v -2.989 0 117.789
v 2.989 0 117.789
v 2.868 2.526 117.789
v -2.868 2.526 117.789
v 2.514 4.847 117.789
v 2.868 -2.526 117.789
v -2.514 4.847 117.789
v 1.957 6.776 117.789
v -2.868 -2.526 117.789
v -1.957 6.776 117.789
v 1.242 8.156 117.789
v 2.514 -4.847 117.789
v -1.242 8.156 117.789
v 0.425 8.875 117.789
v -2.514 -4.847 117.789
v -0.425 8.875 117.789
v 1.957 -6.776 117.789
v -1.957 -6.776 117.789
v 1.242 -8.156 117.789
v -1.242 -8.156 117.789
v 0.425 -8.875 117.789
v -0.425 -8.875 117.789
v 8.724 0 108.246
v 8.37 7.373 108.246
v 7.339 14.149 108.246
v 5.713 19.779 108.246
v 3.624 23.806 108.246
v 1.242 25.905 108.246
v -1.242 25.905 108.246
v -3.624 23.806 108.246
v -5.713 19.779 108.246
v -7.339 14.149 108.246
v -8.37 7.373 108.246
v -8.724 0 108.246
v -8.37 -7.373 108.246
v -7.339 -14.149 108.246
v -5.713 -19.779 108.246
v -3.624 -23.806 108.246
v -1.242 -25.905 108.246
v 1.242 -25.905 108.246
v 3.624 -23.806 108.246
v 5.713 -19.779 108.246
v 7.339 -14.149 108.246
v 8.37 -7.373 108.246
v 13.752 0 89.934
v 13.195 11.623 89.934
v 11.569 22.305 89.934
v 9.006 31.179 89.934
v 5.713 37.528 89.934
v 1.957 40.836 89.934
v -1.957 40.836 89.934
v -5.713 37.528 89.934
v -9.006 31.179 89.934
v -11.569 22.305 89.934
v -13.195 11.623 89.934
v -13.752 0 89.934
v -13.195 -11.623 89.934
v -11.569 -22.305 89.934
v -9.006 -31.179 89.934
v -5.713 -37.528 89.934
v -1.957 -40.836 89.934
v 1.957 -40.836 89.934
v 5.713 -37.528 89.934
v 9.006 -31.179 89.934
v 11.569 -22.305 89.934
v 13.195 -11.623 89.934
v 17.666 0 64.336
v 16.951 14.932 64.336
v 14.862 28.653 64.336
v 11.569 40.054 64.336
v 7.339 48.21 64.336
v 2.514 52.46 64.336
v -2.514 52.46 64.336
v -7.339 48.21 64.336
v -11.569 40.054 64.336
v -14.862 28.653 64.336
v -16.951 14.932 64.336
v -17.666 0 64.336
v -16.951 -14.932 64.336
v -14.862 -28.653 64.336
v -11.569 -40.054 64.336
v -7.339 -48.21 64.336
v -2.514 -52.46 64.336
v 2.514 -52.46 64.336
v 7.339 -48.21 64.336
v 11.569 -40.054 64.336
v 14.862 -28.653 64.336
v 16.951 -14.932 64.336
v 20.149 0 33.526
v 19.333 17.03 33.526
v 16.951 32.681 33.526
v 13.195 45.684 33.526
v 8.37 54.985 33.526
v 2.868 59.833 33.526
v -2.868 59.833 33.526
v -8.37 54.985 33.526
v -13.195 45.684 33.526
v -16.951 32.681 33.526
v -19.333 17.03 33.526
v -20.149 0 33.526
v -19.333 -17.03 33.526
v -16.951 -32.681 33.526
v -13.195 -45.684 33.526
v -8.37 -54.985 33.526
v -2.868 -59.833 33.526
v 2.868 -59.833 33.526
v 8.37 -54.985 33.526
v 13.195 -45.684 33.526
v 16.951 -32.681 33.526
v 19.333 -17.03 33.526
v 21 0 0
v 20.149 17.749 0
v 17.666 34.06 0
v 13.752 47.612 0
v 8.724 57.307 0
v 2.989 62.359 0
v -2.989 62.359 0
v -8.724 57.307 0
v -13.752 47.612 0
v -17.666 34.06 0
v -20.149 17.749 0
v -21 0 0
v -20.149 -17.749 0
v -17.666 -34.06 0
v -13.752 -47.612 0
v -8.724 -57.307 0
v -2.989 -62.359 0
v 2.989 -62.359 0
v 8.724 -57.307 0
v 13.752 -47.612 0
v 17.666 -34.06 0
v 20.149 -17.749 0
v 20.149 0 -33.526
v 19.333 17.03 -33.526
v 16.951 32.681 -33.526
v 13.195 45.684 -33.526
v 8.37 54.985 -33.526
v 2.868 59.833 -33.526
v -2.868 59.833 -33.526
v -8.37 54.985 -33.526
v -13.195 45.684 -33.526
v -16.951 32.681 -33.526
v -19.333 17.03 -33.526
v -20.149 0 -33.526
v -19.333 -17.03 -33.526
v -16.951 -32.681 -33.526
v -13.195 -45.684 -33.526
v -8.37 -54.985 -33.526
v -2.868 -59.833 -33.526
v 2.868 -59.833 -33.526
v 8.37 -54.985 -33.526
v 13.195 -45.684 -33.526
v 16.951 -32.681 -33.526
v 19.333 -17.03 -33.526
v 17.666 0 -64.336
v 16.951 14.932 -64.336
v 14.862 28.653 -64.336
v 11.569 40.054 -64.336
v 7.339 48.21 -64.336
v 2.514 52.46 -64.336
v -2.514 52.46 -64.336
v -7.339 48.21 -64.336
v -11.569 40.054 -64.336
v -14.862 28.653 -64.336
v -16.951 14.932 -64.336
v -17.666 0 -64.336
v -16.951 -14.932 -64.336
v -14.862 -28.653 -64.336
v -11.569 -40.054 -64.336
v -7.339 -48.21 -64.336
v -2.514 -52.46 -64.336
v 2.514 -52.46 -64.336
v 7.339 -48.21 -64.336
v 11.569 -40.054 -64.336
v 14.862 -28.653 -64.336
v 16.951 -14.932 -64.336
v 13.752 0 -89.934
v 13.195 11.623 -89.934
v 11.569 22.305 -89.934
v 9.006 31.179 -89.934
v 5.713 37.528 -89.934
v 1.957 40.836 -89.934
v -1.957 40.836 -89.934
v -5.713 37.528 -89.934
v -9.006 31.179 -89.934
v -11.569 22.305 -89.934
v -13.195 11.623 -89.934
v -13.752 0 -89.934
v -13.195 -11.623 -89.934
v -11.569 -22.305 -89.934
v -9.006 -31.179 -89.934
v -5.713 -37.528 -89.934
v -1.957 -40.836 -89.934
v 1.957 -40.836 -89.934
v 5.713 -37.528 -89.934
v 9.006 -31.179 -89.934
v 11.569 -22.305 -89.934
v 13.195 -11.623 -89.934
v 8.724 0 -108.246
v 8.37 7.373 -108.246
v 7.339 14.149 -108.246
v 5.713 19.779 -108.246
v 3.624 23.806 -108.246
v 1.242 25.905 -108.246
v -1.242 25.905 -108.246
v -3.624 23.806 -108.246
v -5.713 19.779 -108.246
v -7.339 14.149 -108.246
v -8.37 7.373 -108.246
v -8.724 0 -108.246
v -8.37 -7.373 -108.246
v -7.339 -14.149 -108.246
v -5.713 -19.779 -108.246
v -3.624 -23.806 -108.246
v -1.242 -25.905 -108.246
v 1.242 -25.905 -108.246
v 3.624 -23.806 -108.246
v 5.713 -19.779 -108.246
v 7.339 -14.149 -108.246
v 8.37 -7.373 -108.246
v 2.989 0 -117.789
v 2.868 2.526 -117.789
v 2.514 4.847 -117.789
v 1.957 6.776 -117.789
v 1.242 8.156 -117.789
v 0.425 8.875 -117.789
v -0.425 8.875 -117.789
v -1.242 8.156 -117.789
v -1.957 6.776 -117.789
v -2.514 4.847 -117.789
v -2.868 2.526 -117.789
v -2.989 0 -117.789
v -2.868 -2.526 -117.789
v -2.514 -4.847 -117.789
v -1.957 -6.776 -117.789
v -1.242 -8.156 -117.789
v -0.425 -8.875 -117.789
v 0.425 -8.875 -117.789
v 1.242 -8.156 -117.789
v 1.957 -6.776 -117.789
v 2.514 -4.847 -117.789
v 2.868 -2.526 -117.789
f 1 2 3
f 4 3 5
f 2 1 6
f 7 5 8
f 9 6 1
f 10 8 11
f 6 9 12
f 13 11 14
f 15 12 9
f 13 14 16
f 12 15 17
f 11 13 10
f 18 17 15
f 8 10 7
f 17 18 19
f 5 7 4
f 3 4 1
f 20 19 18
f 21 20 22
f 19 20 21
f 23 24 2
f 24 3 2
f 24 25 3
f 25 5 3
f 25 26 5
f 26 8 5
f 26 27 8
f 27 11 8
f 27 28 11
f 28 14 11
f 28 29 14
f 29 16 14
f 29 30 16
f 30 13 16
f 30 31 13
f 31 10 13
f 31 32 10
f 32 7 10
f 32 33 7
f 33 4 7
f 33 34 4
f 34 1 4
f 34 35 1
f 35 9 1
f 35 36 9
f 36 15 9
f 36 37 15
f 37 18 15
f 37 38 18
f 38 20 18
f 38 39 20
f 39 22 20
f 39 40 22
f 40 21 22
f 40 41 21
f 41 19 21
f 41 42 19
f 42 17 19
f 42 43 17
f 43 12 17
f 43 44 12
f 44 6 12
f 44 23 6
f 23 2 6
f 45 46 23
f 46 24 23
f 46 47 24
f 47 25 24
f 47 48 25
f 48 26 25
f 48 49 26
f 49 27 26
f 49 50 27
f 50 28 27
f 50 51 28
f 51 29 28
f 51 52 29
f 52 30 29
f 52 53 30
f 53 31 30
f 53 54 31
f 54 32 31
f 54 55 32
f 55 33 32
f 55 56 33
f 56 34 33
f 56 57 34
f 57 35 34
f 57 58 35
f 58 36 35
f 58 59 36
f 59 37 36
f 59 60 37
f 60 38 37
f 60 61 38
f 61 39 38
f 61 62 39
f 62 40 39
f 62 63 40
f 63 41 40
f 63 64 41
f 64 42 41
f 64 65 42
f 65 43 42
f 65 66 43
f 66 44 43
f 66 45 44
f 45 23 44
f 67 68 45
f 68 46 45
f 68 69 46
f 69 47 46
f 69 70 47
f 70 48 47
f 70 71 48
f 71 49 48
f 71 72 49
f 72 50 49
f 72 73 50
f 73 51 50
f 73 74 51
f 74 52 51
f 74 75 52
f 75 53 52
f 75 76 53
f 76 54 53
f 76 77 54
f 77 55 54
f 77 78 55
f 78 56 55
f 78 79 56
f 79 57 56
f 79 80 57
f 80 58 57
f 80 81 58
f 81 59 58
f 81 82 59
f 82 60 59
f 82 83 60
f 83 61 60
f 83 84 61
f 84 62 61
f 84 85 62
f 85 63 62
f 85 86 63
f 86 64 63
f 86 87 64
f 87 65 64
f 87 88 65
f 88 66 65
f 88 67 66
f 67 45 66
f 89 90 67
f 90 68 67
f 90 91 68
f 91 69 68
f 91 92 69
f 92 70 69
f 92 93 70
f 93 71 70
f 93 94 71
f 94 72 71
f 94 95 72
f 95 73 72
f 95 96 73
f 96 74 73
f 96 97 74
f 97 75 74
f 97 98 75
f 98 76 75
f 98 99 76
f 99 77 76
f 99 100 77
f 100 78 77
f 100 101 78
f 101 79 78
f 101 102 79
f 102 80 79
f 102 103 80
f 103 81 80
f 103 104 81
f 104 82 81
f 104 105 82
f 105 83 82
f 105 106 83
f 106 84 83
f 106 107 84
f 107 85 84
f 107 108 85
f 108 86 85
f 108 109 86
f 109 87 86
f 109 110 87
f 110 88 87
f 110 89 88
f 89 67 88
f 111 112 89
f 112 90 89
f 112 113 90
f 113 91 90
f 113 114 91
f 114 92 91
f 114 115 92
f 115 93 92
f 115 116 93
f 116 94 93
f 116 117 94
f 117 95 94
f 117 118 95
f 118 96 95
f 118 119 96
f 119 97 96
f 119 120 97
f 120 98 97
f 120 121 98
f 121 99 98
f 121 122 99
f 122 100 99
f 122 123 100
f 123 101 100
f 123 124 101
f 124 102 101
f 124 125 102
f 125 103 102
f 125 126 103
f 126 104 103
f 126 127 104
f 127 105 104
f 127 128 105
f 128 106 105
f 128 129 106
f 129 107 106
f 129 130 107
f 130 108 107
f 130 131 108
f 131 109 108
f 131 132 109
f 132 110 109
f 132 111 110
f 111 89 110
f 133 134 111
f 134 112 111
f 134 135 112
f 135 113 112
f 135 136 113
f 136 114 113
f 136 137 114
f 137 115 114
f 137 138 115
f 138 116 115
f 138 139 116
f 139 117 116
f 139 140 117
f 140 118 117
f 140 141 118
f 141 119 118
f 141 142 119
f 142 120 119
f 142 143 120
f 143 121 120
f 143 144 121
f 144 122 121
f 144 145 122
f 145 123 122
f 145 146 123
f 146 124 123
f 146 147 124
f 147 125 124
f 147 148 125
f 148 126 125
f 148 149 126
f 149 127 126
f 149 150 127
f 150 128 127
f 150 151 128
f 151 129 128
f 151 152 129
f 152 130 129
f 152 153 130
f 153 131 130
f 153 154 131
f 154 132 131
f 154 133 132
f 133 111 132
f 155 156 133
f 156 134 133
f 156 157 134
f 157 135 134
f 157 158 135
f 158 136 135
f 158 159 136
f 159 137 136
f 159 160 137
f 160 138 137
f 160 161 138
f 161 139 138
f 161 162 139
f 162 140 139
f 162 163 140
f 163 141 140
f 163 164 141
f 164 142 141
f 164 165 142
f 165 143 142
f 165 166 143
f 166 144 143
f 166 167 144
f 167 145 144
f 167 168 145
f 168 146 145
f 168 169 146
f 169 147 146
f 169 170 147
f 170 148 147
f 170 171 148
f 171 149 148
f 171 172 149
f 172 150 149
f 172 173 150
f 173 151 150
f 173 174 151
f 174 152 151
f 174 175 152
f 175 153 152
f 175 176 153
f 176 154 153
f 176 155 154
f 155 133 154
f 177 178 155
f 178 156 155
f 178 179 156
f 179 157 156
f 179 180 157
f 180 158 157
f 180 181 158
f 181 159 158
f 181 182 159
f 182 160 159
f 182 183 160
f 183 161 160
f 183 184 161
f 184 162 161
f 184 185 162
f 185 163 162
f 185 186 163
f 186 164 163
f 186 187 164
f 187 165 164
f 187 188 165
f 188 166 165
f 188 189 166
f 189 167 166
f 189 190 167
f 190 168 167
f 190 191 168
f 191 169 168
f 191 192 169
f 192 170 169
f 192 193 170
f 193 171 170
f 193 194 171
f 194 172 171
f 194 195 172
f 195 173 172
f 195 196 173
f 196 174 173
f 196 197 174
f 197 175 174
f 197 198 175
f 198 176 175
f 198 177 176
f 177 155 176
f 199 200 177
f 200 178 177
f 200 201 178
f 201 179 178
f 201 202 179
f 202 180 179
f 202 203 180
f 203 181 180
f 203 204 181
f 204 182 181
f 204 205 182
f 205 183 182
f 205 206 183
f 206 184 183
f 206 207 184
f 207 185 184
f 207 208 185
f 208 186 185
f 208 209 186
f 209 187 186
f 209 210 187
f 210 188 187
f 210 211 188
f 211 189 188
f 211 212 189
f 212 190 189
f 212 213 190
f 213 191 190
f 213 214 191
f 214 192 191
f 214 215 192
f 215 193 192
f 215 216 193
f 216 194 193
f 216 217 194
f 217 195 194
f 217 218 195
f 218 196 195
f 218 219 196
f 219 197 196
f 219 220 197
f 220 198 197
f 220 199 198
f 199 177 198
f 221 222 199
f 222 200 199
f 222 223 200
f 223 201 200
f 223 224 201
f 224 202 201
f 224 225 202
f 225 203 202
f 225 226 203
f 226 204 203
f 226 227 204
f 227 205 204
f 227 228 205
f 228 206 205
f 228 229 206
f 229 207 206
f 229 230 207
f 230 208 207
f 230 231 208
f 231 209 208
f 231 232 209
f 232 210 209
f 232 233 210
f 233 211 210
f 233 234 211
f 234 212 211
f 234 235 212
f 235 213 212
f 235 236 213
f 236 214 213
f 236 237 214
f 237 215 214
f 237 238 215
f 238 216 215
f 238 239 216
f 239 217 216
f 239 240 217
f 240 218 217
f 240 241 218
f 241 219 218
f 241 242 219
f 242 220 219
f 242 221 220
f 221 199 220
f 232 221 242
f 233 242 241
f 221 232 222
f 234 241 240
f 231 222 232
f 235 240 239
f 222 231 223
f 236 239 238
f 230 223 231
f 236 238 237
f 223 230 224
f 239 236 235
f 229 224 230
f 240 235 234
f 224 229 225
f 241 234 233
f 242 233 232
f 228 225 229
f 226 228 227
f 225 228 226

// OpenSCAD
// Generated by SolidPython 1.0.1 on 2020-07-29 00:46:45


scale(v = [3, 9, 17]) {
	sphere(r = 7);
}
/***********************************************
*********      SolidPython code:      **********
************************************************
 
# import packages: SolidPython
from solid import *
from solid.utils import *
from itertools import chain, combinations, permutations


class Resize:

    def __init__(self, scad_file):
        self.scad_file = scad_file
        #self.scad_file = import_scad(scad_file)
        # cone/cylinder param:
        self.r1 = 0
        self.r2 = 0
        self.h = 0
        # rectangular prism param:
        self.w = 0
        self.l = 0
        # ellipse param:
        self.r = 0

    # import OpenScad code (file name corresponds to shape)


    # classify shape + parameters
    def assign(self, param1, param2, param3):
        if self.scad_file == 'cone.scad':
            self.r1 = param1
            self.r2 = param2
            self.h = param3
        elif self.scad_file == 'cylinder.scad':
            self.r1 = param1
            self.r2 = param2
            self.h = param3
        elif self.scad_file == 'rectangularPrism.scad':
            self.h = param1
            self.l = param2
            self.w = param3
        else:
            self.r = param1
            self.h = param2

    # resize parameters
    def iterate(self):
        x = range(3, 20, 2)
        i = 1
        if self.scad_file == 'cone.scad':
            tempList = list(permutations(x, 2))
            for temp in tempList:
                param1 = temp[0]
                param2 = temp[1]
                filepath = 'produced_scad_files/' + 'cone' + str(param1) + '_' + str(param2) + '_' + '.scad'
                scad_render_to_file(cylinder(h=param1, r1=param2, r2=0), filepath)

        elif self.scad_file == 'cylinder.scad':
            tempList = list(permutations(x, 3))
            for temp in tempList:
                param1 = temp[0]
                param2 = temp[1]
                filepath = 'produced_scad_files/' + 'cylinder' + str(param1) + '_' + str(param2) + '_' + '.scad'
                scad_render_to_file(cylinder(h=param1, r1=param2, r2=param2), filepath)

        elif self.scad_file == 'rectangularPrism.scad':
            tempList = list(permutations(x, 3))
            for temp in tempList:
                param1 = temp[0]
                param2 = temp[1]
                param3 = temp[2]
                filepath = 'produced_scad_files/' + 'rectangularPrism' + str(param1) + '_' + str(param2) + '_' + str(
                    param3) + '.scad'
                scad_render_to_file(cube(size=(param1, param2, param3)), filepath)

        elif self.scad_file == 'ellipse.scad':
            tempList = list(permutations(x, 4))
            for temp in tempList:
                param1 = temp[0]
                param2 = temp[1]
                param3 = temp[2]
                param4 = temp[3]
                filepath = 'produced_scad_files/' + 'ellipse' + str(param1) + '_' + str(param2) + '_' + str(param3) + '_' + str(param4) + '.scad'
                scad_render_to_file(scale([param1, param2, param3])(sphere(r=param4)), filepath)

    def render_to_scadfile(self):
        scad_render_to_file(scad, 'example.scad') 
 
************************************************/
